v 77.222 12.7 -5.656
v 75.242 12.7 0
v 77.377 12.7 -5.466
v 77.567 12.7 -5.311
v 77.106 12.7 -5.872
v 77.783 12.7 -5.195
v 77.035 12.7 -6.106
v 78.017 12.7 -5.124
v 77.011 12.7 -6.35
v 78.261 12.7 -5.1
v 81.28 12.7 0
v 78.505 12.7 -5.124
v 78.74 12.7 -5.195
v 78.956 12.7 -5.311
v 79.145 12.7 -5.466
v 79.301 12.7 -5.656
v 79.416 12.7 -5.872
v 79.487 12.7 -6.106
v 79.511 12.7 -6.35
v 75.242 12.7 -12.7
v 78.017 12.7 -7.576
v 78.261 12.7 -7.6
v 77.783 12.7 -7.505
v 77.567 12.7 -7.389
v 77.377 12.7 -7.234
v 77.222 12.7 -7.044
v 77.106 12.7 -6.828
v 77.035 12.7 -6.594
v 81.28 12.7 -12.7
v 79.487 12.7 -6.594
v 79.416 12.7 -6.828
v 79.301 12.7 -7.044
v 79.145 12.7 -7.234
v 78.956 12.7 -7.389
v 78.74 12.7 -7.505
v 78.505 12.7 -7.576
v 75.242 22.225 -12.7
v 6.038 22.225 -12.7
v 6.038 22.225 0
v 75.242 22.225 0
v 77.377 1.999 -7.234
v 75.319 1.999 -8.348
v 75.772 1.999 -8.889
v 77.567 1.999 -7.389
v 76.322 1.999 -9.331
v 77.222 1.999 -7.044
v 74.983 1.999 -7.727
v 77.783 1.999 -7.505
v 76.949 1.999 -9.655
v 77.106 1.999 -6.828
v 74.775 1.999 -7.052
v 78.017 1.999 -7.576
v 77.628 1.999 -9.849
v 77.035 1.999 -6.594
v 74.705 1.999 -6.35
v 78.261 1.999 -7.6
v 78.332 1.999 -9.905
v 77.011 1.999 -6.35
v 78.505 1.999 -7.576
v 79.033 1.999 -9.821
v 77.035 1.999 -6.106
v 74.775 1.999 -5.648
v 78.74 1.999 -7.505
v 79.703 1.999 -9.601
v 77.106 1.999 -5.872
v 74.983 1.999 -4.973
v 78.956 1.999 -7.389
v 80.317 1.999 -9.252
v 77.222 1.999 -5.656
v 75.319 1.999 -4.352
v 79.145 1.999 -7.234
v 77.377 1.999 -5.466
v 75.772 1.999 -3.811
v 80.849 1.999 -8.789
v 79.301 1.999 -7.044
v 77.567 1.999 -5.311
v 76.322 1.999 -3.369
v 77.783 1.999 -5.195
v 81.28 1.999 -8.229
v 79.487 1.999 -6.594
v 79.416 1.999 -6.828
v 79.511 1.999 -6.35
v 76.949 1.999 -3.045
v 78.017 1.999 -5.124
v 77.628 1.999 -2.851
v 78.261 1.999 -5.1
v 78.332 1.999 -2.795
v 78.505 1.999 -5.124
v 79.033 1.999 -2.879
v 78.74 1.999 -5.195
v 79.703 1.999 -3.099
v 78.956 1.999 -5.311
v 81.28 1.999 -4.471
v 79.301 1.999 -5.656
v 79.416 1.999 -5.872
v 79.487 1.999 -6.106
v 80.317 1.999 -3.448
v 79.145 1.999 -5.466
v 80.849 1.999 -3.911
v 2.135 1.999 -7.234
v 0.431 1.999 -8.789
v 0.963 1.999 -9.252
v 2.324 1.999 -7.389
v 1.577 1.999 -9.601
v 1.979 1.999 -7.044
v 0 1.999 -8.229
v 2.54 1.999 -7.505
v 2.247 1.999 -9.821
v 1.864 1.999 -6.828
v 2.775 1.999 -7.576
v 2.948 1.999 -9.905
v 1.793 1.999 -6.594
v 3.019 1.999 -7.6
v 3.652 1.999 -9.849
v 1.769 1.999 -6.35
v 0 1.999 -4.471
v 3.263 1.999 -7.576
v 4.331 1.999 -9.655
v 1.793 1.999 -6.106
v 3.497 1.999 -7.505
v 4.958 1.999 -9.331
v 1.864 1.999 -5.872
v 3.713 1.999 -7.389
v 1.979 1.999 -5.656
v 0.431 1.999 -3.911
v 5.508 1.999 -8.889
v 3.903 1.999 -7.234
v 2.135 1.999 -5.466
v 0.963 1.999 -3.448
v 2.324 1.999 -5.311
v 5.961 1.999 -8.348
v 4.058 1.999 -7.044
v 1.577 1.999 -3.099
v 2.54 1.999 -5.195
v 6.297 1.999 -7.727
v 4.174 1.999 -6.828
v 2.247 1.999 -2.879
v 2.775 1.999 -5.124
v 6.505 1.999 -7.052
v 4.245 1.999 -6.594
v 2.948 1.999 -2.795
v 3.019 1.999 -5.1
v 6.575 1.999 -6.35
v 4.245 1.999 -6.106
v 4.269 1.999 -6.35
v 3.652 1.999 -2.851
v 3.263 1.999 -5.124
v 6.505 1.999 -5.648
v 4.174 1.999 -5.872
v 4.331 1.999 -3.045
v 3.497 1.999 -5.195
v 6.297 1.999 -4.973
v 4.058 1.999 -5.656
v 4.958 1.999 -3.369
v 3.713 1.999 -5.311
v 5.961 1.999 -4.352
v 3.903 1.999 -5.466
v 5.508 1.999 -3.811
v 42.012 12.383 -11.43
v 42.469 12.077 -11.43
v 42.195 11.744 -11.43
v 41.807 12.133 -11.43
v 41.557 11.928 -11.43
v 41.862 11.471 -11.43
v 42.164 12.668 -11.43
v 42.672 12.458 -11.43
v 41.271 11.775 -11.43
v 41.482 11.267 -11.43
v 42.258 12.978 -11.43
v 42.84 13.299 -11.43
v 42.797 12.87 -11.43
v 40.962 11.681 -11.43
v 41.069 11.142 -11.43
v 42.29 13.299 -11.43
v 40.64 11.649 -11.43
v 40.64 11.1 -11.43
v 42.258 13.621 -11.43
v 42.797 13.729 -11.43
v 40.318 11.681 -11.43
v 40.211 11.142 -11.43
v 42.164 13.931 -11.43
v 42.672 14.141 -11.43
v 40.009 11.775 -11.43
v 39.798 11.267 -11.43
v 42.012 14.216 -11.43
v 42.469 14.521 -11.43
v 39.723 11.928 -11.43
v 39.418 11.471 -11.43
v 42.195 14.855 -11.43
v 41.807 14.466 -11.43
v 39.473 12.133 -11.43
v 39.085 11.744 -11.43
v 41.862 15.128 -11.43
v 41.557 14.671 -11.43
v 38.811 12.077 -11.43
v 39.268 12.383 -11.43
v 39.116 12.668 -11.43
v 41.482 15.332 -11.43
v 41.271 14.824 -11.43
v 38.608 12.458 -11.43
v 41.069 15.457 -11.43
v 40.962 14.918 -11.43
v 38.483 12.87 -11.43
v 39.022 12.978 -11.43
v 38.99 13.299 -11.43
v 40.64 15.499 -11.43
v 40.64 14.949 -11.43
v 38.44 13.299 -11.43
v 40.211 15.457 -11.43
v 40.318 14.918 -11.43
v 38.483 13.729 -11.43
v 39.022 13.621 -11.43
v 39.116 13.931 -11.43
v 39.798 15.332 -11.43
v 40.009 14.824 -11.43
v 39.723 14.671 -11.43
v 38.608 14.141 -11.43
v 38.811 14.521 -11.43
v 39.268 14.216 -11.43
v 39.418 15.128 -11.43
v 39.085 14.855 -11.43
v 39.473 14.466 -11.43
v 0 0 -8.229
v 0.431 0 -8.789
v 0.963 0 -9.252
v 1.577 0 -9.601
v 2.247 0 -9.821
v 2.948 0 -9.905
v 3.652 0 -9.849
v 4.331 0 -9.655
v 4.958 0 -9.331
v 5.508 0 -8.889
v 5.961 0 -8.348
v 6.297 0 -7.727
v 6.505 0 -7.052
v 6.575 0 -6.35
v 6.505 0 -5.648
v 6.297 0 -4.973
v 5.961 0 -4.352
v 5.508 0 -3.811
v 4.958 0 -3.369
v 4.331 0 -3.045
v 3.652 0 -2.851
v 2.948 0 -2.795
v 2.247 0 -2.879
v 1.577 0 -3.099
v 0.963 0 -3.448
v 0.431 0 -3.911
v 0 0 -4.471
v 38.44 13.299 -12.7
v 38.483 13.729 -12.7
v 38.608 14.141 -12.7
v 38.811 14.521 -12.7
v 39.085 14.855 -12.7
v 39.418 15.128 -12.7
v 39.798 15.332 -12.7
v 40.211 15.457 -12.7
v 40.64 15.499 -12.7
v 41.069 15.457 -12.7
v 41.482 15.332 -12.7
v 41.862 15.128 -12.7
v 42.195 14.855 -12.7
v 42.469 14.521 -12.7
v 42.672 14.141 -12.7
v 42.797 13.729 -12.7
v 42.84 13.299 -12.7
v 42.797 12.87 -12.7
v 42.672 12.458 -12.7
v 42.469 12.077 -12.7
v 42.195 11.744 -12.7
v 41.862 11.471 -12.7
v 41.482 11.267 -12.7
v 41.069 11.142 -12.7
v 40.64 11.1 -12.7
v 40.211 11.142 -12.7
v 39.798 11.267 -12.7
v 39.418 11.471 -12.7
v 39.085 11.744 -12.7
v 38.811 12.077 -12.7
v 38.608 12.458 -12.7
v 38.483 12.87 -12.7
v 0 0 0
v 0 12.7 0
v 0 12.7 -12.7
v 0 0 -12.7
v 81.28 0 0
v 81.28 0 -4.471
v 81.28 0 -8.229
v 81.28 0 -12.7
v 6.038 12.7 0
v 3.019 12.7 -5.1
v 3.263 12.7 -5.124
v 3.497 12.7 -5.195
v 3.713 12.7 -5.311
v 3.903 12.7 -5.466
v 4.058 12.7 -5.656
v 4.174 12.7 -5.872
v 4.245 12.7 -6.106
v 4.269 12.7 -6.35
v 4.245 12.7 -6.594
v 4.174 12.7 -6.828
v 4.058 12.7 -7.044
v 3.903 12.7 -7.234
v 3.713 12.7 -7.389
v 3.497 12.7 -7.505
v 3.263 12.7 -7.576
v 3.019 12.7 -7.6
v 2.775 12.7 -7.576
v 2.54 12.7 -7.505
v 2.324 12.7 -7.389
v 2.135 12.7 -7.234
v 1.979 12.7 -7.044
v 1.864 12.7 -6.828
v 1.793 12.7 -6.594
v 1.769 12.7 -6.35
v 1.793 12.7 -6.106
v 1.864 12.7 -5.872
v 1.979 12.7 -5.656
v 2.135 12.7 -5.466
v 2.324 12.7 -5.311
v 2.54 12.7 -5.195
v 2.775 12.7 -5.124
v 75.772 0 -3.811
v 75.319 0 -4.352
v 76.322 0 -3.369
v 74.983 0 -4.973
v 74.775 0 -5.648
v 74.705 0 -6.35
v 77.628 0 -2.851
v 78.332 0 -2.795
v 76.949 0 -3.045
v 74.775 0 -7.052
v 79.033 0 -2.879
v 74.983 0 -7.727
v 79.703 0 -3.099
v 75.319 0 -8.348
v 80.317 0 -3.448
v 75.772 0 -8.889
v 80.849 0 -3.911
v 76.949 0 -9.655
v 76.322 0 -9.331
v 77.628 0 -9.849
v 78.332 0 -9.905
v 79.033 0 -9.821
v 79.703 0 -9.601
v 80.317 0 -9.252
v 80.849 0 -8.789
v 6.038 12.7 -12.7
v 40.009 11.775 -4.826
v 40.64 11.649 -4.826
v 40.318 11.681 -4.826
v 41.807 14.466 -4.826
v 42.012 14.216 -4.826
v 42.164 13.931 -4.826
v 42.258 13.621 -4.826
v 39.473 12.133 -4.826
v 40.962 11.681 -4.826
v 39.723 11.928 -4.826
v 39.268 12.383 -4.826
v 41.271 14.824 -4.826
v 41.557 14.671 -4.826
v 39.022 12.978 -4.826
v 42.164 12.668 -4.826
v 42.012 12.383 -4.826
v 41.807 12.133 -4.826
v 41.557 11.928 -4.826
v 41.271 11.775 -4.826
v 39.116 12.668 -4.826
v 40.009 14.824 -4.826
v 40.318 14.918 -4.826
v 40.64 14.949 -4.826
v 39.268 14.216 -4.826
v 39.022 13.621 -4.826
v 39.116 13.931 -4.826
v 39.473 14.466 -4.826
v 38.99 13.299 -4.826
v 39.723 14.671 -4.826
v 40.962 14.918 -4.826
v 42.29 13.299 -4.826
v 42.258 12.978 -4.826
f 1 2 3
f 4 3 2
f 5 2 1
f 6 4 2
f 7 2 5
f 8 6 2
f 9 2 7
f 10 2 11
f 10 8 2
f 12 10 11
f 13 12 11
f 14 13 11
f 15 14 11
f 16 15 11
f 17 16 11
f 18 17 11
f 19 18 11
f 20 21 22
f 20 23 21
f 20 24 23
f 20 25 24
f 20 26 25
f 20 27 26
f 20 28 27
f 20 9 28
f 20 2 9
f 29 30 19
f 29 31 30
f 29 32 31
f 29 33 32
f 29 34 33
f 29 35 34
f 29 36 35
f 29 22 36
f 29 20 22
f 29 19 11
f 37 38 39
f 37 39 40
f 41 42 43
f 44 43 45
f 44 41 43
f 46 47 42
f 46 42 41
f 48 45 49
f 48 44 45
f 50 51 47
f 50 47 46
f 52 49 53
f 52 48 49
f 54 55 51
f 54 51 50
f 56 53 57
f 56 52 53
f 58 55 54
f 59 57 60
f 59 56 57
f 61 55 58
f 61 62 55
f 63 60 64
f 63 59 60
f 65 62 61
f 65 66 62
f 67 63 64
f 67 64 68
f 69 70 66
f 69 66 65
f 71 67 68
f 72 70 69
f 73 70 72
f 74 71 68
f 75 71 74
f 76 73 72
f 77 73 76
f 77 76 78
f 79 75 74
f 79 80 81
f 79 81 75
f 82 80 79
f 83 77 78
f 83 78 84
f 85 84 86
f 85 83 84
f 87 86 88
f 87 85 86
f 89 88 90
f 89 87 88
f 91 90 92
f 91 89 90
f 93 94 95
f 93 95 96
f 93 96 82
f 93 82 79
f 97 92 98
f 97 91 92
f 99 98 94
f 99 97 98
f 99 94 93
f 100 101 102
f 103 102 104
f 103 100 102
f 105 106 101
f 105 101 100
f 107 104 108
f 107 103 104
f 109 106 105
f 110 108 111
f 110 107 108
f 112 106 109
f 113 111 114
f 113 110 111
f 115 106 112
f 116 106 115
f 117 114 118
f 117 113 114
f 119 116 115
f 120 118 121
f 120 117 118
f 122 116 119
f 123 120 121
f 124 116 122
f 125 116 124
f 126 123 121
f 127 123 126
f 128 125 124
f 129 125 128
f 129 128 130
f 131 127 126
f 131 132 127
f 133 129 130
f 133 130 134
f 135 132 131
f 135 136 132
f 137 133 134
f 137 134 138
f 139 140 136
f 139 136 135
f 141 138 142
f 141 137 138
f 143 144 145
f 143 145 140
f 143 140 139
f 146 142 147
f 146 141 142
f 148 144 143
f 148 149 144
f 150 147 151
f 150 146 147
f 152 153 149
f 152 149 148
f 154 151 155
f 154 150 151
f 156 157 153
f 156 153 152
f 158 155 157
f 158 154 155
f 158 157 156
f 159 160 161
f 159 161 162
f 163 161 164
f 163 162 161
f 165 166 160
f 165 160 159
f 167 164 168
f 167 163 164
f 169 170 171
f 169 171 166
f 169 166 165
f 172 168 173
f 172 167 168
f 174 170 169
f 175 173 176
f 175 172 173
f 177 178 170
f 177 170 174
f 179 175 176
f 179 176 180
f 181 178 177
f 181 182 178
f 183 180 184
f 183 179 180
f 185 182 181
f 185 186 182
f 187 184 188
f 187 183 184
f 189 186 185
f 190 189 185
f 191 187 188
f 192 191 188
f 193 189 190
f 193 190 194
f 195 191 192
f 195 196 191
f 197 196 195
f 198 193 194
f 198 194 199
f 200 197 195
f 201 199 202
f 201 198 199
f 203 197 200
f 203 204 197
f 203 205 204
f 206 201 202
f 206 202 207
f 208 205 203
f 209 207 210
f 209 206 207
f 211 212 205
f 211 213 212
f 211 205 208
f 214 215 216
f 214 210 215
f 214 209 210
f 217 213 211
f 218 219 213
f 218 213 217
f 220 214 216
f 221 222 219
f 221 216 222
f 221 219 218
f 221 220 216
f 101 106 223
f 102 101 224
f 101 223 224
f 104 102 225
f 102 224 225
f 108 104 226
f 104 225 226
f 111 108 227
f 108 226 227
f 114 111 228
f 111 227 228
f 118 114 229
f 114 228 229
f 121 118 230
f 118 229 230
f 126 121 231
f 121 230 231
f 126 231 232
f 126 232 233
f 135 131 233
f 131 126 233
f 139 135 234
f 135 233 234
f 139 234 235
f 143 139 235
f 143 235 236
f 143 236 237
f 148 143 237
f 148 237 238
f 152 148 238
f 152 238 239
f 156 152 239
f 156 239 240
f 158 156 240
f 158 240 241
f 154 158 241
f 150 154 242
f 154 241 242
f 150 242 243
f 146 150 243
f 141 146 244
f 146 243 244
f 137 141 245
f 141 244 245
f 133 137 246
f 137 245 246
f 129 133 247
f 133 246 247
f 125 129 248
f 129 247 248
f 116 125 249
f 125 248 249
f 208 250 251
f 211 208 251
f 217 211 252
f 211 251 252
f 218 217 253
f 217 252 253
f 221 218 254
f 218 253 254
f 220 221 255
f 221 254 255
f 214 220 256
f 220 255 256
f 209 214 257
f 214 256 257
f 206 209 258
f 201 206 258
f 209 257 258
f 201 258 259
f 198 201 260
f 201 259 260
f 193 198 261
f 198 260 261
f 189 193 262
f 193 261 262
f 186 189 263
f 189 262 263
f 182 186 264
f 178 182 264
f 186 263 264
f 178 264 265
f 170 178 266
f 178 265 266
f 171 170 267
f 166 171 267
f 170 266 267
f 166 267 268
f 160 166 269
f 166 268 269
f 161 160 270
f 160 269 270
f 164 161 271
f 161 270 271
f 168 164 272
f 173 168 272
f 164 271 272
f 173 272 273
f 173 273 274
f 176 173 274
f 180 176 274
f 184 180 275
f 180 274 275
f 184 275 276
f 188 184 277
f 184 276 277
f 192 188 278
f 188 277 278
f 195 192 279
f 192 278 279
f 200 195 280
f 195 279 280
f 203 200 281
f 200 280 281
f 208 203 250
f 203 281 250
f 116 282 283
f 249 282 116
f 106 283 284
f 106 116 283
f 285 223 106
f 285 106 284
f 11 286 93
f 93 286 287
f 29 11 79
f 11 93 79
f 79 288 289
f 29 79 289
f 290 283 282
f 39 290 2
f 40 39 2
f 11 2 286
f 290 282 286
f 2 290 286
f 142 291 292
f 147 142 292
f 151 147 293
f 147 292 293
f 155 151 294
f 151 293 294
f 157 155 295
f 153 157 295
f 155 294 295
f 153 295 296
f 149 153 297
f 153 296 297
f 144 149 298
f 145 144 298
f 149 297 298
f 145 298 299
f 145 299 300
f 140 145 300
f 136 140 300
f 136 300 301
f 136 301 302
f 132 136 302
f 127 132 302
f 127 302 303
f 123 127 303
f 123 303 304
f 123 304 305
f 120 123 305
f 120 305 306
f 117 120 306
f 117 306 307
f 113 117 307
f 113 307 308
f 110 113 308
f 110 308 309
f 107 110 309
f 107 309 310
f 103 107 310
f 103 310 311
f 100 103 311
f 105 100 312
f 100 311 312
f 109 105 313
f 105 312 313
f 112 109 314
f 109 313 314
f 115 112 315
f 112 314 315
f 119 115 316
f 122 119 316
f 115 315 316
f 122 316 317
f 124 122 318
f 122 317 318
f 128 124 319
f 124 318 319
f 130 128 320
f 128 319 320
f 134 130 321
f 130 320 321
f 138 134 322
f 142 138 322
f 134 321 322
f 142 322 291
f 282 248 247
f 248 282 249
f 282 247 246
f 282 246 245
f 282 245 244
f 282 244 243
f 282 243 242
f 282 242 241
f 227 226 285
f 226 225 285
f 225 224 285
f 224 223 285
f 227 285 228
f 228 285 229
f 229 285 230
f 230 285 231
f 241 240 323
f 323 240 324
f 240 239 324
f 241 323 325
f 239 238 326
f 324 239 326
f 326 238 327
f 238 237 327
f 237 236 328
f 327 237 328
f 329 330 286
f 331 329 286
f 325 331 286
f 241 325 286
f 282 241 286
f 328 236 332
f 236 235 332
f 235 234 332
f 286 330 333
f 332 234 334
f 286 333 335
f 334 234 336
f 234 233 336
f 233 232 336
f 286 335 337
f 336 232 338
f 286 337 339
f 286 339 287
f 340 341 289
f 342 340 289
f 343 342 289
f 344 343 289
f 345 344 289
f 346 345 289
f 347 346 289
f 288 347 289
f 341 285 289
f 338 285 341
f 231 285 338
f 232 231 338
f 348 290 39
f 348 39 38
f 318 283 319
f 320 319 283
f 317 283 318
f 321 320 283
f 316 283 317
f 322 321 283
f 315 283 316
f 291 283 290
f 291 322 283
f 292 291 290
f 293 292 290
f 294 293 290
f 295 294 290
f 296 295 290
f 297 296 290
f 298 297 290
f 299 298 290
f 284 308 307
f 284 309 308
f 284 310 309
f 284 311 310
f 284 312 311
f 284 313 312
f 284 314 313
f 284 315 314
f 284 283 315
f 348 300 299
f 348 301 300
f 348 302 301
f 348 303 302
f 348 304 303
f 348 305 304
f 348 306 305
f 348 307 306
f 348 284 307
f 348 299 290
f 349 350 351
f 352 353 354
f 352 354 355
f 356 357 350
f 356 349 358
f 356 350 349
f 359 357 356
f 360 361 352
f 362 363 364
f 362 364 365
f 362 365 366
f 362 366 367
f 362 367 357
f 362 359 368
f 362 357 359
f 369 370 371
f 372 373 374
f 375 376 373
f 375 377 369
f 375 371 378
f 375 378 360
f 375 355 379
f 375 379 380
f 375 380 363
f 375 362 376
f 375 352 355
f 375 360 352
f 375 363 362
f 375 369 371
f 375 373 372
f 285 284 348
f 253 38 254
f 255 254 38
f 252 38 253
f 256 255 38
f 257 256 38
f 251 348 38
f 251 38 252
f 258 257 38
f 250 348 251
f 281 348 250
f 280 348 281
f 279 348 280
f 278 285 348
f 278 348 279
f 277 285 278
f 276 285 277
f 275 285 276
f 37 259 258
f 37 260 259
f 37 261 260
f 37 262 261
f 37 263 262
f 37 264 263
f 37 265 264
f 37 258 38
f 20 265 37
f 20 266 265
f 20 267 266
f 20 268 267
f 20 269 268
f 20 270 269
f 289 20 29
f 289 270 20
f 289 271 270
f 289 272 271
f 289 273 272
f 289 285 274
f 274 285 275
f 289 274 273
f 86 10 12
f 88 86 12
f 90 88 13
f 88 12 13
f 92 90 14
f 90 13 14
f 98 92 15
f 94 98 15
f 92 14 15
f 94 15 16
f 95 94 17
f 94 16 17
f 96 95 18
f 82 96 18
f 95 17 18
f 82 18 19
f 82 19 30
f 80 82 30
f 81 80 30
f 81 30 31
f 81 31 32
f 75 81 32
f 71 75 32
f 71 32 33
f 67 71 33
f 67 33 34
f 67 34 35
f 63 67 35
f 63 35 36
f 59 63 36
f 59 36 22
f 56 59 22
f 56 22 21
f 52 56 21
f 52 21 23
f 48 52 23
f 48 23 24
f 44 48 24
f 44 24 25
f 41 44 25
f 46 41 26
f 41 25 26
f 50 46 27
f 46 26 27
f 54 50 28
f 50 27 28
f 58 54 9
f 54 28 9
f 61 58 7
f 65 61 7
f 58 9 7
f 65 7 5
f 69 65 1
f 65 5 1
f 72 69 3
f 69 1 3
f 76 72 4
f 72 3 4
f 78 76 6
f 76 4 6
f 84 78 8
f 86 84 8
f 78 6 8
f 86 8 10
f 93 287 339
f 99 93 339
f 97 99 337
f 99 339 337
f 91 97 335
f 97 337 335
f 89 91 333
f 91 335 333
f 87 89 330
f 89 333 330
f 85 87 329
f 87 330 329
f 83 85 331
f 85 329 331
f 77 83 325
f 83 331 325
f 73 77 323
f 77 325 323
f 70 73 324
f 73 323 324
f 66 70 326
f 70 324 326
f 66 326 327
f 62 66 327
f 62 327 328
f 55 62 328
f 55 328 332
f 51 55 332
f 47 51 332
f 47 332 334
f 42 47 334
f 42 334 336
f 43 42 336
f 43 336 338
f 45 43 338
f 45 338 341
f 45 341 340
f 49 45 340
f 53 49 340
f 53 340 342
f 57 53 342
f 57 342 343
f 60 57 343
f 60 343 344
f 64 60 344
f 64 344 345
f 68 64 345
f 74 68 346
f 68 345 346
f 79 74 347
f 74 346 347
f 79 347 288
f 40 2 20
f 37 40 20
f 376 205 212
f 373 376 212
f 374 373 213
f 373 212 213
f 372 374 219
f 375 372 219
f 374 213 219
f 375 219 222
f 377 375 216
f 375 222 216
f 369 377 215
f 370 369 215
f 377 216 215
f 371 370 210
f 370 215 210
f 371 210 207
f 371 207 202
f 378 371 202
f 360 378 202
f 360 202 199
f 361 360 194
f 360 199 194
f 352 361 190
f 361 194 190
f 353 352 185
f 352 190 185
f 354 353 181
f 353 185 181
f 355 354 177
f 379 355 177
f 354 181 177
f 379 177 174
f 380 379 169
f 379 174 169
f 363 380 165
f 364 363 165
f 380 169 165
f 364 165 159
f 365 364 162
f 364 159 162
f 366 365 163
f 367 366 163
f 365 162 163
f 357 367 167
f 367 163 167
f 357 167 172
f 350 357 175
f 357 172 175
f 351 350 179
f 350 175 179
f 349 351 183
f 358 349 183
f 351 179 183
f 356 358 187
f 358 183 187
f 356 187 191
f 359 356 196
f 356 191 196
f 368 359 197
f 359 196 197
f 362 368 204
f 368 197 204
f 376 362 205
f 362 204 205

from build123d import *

# Parameters (mm, degrees)
SKETCH1_W           = 81.28
SKETCH1_H           = 12.7
BOSS_EXTRUDE1_DEPTH = 12.7
SKETCH2_W           = 69.20484
SKETCH2_H           = 12.7
BOSS_EXTRUDE2_DEPTH = 9.525
SKETCH3_R           = 1.25
CUT_EXTRUDE2_DEPTH  = 84.24072561
SKETCH5_R           = 3.556
CUT_EXTRUDE3_DEPTH  = 1.99898
SKETCH6_R           = 2.19964
CUT_EXTRUDE4_DEPTH  = 1.27
SKETCH7_R           = 1.650000002
CUT_EXTRUDE5_DEPTH  = 6.604


with BuildPart() as part:
    # Sketch1 → Boss-Extrude1 (new body)
    with BuildSketch(Plane(origin=(0, 0, 0), x_dir=(1, 0, 0), z_dir=(0, 1, 0))):
        with Locations((40.64, 6.35)):
            Rectangle(SKETCH1_W, SKETCH1_H)
    extrude(amount=BOSS_EXTRUDE1_DEPTH)

    # Sketch2 → Boss-Extrude2 (add)
    with BuildSketch(Plane(origin=(0, 12.7, 0), x_dir=(1, 0, 0), z_dir=(0, 1, 0))):
        with Locations((40.64, 6.35)):
            Rectangle(SKETCH2_W, SKETCH2_H)
    extrude(amount=BOSS_EXTRUDE2_DEPTH)

    # Sketch3 → Cut-Extrude2 (cut, through all)
    with BuildSketch(Plane(origin=(0, 12.7, 0), x_dir=(1, 0, 0), z_dir=(0, 1, 0))):
        with Locations(Location((3.01879, 6.35, 0), (0, 0, 270))):
            Circle(SKETCH3_R)
        with Locations(Location((78.26121, 6.35, 0), (0, 0, 270))):
            Circle(SKETCH3_R)
    extrude(amount=-CUT_EXTRUDE2_DEPTH, mode=Mode.SUBTRACT)

    # Sketch5 → Cut-Extrude3 (cut)
    with BuildSketch(Plane.XZ):
        with Locations((3.01879, -6.35)):
            Circle(SKETCH5_R)
        with Locations((78.26121, -6.35)):
            Circle(SKETCH5_R)
    extrude(amount=-CUT_EXTRUDE3_DEPTH, mode=Mode.SUBTRACT)

    # Sketch6 → Cut-Extrude4 (cut)
    with BuildSketch(Plane(origin=(0, 0, -12.7), x_dir=(-1, 0, 0), z_dir=(0, 0, -1))):
        with Locations((-40.64, 13.29944)):
            Circle(SKETCH6_R)
    extrude(amount=-CUT_EXTRUDE4_DEPTH, mode=Mode.SUBTRACT)

    # Sketch7 → Cut-Extrude5 (cut)
    with BuildSketch(Plane(origin=(0, 0, -11.43), x_dir=(-1, 0, 0), z_dir=(0, 0, -1))):
        with Locations((-40.64, 13.29944)):
            Circle(SKETCH7_R)
    extrude(amount=-CUT_EXTRUDE5_DEPTH, mode=Mode.SUBTRACT)


solid = part.part
